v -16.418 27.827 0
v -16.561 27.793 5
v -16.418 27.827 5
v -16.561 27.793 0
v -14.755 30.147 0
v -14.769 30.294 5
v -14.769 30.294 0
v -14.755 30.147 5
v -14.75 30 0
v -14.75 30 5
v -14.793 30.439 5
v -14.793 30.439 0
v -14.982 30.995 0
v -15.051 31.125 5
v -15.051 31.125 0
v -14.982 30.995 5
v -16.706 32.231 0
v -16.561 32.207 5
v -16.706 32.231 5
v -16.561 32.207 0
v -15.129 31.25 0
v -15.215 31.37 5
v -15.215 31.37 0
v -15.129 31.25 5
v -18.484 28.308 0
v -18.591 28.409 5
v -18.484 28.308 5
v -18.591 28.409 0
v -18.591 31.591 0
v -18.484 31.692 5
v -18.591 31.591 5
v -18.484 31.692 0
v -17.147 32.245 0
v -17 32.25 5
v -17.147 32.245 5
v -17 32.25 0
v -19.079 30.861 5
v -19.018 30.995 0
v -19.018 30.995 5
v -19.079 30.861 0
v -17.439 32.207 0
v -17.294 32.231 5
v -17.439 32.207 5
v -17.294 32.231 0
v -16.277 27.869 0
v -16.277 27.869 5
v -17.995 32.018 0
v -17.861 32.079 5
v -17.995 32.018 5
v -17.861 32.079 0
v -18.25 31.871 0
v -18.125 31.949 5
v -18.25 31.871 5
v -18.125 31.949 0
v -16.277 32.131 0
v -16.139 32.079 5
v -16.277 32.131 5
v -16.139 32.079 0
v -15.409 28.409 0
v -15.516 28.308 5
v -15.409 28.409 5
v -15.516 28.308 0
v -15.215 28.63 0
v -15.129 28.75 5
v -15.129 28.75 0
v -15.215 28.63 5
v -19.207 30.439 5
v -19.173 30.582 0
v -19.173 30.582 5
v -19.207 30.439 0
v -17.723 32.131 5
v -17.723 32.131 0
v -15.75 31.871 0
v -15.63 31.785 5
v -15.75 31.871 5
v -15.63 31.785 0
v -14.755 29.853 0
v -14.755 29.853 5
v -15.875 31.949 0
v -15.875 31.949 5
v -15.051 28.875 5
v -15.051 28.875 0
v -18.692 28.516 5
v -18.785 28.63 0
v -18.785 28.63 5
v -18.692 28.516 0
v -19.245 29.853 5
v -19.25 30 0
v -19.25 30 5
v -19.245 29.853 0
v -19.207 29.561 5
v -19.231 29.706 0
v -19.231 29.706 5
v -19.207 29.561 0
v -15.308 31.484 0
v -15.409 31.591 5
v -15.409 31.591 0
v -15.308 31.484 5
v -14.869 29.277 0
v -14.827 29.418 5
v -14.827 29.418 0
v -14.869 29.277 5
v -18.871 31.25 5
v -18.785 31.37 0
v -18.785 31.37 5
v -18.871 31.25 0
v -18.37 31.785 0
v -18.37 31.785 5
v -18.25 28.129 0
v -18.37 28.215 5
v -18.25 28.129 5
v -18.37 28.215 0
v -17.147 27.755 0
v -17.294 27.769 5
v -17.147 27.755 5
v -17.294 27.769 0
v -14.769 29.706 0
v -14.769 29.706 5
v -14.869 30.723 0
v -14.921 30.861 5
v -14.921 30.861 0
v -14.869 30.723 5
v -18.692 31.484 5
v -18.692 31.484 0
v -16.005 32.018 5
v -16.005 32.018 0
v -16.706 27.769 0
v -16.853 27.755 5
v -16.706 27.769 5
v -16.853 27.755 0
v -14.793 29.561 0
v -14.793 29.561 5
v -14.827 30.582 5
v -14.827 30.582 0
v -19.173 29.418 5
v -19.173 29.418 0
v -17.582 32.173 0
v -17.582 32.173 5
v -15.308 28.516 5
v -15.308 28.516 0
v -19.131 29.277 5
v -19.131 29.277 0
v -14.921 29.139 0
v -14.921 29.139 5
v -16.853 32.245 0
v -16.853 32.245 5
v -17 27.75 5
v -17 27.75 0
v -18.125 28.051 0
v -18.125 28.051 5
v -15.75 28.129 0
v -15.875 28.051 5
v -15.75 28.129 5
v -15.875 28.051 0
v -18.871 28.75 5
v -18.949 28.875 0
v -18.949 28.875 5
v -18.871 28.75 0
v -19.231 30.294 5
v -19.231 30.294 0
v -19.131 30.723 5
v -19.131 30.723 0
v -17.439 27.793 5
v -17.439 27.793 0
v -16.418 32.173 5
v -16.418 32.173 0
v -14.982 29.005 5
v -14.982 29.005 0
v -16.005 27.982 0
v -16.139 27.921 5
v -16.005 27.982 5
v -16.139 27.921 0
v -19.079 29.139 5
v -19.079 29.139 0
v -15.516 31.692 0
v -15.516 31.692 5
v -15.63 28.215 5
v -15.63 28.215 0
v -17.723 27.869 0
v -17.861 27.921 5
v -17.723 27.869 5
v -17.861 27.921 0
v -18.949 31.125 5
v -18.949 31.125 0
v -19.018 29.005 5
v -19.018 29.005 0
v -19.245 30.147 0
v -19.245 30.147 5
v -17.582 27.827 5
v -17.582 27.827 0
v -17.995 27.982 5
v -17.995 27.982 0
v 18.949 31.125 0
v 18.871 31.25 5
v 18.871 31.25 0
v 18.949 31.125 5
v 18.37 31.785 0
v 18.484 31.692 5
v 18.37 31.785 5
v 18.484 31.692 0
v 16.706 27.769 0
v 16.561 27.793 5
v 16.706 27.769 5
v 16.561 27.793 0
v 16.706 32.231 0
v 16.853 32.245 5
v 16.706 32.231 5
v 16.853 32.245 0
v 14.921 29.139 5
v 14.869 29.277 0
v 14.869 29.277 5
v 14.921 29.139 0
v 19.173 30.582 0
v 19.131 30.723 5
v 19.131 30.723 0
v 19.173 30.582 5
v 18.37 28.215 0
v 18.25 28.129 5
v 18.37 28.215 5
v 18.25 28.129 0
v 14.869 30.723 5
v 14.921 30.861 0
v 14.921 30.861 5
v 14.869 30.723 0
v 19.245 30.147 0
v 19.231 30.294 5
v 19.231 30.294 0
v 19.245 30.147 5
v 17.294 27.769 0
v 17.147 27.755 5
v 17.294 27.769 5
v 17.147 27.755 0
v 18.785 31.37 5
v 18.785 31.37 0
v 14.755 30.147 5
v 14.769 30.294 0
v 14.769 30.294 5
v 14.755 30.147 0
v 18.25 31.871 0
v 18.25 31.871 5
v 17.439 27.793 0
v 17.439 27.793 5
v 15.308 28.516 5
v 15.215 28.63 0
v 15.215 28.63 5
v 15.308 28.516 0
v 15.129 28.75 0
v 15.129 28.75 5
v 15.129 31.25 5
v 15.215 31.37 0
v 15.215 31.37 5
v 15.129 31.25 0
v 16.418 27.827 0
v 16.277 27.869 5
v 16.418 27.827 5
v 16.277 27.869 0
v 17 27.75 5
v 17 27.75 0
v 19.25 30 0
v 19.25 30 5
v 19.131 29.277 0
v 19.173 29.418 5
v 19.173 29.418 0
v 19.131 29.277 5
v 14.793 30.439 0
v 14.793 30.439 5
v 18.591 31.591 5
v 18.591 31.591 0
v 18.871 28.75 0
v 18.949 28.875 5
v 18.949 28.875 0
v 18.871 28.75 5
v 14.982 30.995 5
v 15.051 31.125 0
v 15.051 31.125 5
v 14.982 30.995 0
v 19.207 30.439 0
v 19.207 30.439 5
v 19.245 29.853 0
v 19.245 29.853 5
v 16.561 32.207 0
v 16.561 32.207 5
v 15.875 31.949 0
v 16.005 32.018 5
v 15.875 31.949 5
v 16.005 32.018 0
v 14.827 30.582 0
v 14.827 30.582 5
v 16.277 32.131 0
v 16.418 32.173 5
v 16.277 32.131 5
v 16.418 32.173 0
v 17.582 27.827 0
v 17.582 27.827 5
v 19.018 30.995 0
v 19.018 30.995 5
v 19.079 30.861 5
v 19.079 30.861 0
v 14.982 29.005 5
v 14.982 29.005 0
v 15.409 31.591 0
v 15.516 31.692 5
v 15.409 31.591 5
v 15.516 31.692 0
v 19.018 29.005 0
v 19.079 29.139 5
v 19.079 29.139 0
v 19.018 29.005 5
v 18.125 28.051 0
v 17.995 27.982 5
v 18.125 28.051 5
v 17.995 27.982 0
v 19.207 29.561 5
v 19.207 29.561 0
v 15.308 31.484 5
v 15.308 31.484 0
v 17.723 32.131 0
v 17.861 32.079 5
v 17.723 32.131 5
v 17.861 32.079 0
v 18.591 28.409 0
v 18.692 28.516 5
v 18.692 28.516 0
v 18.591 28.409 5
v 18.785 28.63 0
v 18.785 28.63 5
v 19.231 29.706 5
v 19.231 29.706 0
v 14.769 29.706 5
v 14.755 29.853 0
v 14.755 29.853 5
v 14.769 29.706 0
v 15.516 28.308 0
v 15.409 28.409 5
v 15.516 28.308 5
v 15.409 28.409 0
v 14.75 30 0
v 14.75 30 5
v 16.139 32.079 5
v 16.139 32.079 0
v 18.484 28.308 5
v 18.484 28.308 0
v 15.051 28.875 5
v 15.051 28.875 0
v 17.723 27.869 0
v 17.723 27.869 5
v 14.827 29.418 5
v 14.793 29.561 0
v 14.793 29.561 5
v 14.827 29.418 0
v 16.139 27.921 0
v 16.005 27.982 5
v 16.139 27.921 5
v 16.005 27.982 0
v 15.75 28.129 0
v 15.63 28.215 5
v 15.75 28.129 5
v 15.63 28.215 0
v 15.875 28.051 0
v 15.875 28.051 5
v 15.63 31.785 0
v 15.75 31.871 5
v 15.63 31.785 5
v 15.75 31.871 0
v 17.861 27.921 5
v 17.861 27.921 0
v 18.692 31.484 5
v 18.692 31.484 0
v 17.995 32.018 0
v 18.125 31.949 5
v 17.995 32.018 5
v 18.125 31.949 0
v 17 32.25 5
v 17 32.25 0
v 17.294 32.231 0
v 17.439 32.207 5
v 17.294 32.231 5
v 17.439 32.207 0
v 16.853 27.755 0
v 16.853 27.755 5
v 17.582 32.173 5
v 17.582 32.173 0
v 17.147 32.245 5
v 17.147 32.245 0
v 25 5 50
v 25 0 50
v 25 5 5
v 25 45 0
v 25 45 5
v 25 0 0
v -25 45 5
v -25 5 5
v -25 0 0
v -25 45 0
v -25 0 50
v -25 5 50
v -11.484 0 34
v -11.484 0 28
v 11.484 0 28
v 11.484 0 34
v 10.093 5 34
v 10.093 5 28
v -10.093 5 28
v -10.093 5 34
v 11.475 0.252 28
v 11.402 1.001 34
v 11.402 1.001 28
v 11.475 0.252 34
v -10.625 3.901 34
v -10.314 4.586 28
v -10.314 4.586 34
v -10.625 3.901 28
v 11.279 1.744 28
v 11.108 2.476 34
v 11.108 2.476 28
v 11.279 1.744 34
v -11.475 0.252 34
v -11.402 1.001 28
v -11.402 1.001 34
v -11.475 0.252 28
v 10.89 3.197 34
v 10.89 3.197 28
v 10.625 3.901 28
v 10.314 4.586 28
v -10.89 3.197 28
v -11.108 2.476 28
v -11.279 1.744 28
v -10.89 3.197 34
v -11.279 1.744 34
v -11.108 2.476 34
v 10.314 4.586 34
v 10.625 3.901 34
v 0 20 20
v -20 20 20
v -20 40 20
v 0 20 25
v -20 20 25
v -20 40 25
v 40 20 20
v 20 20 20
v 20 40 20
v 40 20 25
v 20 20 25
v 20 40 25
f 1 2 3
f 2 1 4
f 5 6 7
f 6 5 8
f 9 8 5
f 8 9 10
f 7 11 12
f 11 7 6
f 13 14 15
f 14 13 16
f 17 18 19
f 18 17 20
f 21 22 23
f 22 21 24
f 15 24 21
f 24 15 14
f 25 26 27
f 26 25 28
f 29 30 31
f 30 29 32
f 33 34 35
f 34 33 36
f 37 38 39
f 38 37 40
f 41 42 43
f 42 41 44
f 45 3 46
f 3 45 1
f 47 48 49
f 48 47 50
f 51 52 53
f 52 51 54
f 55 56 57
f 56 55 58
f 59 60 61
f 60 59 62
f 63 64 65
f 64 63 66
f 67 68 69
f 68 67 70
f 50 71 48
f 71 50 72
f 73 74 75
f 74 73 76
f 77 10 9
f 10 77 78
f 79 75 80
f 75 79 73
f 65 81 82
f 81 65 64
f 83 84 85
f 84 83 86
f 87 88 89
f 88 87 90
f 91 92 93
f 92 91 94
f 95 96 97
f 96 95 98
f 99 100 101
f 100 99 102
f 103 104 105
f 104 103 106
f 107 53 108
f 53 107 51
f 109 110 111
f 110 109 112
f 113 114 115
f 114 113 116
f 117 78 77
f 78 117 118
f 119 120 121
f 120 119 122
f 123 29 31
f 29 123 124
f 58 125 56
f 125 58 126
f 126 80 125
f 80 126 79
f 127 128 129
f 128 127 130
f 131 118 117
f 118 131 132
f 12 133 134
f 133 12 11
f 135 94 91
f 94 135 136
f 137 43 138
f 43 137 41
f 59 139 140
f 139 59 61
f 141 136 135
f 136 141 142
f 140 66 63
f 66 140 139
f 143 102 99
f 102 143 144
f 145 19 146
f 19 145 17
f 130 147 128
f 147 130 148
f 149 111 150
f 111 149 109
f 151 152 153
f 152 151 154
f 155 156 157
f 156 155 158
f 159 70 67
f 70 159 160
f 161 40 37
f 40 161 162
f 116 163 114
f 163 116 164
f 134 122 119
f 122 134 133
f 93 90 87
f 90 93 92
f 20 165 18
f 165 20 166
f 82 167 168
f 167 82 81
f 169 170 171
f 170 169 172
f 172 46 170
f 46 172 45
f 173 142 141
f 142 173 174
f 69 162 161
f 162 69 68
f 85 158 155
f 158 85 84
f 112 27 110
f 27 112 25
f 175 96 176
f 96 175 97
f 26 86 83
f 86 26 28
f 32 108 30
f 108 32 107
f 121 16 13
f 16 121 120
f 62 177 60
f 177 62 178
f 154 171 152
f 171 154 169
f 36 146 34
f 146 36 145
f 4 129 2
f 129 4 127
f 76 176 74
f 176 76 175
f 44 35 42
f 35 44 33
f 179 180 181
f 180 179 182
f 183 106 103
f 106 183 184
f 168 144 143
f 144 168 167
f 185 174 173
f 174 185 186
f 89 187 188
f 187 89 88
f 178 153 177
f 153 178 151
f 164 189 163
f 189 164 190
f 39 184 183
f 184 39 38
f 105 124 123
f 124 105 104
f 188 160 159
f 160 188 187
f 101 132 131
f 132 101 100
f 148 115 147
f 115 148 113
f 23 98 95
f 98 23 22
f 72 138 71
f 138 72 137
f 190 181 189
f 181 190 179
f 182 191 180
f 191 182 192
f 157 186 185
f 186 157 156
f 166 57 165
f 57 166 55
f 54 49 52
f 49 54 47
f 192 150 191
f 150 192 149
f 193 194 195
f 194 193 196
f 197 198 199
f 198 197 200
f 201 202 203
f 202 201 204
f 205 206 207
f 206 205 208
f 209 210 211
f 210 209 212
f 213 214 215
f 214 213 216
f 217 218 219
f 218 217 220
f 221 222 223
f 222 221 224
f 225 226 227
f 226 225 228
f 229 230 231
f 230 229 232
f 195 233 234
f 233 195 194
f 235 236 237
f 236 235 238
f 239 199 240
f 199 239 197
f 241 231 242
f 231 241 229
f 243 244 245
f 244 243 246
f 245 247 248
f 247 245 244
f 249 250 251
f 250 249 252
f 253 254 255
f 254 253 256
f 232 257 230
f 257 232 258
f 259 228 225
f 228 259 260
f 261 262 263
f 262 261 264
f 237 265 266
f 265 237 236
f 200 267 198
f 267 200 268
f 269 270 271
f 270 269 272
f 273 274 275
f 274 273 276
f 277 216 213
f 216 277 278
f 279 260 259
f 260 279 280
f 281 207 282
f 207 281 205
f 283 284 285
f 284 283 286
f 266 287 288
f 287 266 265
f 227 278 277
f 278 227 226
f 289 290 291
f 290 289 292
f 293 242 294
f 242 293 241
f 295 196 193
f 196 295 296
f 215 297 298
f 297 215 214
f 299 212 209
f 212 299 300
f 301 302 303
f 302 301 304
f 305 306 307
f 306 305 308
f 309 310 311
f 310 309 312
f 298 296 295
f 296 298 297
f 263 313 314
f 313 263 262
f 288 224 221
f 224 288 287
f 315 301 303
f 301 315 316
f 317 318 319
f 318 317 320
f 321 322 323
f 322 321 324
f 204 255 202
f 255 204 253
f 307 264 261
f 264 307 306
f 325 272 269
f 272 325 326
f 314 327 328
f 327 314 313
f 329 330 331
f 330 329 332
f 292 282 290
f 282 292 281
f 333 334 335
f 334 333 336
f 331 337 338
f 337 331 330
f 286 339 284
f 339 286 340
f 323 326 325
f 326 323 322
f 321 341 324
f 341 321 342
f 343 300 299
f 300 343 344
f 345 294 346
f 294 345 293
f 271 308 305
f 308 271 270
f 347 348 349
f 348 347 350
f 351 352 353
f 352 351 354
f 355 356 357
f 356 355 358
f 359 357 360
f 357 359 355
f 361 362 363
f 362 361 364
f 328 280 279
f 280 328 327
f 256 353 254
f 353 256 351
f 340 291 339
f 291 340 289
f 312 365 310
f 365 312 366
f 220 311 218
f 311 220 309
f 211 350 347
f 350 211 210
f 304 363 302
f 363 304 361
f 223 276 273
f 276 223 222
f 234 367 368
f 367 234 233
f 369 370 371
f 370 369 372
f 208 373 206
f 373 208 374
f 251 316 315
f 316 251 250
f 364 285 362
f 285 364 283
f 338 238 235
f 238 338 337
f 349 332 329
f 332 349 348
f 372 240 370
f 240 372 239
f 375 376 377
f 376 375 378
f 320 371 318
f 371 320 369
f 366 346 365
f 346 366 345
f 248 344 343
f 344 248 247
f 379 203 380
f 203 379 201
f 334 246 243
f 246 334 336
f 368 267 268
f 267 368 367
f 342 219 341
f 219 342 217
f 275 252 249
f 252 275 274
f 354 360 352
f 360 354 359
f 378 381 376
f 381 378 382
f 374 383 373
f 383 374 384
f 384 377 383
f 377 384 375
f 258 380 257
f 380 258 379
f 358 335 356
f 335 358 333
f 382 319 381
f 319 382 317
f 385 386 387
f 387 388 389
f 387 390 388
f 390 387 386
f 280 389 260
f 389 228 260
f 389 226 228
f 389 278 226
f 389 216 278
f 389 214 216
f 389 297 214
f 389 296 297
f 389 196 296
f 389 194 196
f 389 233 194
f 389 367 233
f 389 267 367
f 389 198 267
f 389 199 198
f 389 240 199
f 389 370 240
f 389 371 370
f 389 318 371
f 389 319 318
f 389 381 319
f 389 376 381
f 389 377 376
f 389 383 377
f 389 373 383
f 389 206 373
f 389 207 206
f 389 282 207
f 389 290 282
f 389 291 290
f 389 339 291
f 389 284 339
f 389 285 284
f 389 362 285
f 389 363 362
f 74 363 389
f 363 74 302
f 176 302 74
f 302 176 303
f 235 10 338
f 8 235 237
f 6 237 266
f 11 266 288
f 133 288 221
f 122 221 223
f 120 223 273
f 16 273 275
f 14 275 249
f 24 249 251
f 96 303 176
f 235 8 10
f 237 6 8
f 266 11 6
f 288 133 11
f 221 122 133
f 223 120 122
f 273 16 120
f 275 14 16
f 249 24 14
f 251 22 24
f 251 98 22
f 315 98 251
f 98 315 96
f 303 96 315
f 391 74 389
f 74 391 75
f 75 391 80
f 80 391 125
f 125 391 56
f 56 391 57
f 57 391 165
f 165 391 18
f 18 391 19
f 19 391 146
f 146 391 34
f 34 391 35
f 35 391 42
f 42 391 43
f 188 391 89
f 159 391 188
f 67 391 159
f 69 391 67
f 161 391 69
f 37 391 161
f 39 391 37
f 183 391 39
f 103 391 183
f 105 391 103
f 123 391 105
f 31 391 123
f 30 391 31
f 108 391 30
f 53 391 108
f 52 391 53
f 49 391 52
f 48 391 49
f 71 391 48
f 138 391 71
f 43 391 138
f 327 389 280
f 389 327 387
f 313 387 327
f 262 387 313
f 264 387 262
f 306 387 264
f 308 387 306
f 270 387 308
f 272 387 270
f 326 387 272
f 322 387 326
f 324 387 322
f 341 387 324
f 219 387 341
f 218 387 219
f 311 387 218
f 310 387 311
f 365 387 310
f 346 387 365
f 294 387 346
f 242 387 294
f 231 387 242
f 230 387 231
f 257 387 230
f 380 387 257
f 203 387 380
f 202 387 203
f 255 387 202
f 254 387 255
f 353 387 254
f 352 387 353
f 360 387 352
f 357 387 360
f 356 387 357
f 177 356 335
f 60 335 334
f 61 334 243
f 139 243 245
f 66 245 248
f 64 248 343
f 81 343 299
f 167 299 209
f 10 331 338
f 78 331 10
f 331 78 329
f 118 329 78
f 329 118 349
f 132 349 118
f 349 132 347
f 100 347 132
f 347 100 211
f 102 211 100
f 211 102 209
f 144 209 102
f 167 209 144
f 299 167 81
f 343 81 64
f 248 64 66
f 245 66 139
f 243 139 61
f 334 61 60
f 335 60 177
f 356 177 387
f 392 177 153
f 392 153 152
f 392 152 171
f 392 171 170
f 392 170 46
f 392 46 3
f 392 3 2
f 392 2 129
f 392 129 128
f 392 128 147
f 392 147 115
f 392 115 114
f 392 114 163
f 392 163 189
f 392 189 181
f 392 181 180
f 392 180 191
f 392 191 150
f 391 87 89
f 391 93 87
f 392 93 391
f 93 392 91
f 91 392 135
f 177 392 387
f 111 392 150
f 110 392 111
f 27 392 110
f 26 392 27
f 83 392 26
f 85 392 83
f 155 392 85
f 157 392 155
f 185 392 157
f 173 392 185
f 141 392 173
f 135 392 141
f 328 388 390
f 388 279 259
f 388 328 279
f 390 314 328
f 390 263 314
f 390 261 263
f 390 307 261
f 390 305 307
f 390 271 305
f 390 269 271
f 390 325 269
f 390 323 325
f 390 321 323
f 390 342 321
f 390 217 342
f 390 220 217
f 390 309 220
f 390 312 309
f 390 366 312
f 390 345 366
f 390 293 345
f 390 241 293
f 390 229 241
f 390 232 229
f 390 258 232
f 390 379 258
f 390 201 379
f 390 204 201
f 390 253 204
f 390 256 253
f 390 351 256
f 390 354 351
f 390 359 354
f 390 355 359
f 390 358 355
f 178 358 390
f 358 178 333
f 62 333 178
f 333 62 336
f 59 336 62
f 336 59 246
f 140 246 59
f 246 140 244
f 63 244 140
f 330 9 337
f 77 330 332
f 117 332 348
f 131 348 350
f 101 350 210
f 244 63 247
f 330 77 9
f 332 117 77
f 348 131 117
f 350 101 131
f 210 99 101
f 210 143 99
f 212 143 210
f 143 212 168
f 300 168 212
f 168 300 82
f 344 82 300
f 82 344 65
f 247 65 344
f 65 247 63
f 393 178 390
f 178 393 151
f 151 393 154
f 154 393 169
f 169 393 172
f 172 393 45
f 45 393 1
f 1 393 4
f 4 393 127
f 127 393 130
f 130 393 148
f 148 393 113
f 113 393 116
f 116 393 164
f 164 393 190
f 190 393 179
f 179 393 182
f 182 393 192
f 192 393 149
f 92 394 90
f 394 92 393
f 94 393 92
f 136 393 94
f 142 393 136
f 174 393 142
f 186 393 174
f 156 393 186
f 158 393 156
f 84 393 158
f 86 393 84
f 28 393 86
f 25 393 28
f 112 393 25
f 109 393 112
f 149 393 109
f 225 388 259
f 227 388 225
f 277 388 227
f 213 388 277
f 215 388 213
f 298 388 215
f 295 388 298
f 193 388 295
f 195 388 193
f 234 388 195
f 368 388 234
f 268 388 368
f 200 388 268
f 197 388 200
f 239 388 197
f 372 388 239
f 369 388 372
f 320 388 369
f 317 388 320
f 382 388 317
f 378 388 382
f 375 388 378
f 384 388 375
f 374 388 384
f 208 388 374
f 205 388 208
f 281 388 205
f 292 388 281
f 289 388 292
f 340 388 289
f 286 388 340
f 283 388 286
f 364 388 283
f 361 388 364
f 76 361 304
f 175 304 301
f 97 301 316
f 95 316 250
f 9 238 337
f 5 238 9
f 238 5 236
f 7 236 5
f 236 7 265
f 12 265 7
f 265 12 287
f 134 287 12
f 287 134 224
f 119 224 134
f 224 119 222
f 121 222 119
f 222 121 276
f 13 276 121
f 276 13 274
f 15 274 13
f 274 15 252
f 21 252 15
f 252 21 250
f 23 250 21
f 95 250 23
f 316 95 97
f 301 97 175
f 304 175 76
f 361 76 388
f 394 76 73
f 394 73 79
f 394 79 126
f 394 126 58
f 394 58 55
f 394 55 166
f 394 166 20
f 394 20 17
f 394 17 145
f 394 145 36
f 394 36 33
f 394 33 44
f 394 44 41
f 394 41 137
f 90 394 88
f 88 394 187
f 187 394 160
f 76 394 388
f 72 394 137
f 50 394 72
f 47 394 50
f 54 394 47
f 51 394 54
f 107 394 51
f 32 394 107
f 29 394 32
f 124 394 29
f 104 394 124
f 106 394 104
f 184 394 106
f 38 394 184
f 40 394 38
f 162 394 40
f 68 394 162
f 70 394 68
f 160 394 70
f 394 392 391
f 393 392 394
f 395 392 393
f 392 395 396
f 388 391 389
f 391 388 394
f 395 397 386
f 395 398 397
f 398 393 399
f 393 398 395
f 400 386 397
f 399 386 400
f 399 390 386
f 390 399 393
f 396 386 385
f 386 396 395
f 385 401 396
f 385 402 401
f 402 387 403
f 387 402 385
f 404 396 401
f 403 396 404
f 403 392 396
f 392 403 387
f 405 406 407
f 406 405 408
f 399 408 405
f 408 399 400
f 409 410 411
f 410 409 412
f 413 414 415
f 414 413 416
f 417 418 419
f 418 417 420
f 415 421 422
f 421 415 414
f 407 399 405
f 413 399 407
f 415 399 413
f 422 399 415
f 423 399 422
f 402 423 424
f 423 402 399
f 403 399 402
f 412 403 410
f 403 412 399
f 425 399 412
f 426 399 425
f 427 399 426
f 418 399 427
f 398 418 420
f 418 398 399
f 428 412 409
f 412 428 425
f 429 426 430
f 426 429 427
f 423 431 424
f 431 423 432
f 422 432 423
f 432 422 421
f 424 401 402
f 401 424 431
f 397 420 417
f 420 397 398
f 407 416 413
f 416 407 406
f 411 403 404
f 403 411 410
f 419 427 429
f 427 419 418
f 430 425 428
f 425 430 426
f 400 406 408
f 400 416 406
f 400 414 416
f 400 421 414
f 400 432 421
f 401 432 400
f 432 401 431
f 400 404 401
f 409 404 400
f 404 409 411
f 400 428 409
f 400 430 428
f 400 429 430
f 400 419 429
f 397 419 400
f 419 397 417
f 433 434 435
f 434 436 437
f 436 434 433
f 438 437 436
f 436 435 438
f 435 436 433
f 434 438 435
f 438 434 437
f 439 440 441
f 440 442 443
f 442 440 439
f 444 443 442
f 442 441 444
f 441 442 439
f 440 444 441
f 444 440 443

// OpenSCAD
// L-shaped mounting bracket for NEMA 17 stepper motor (syringe pump)
// Print orientation: base plate on bed, motor plate builds upward (+Z)

// ---------- Parameters ----------
base_x0      = -25;   // base plate x start
base_x1      = 25;    // base plate x end
base_y0      = 0;     // base plate y start
base_y1      = 45;    // base plate y end
base_z0      = 0;     // base plate z start
base_z1      = 5;     // base plate z end

motor_x0     = -25;   // motor plate x start
motor_x1     = 25;    // motor plate x end
motor_y0     = 0;     // motor plate y start
motor_y1     = 5;     // motor plate y end
motor_z0     = 0;     // motor plate z start
motor_z1     = 50;    // motor plate z end

boss_d       = 23;    // motor centring boss hole diameter
boss_x       = 0;     // boss hole x centre
boss_z       = 28;    // boss hole z centre
screw_d      = 3.4;   // M3 screw holes diameter
screw_n      = 4;     // number of screw holes
screw_pitch  = 31;    // square pattern side length

gusset_t     = 5;     // gusset thickness along X
gusset_y     = 20;    // gusset leg along +Y
gusset_z     = 20;    // gusset leg along +Z

eps          = 0.5;   // cutter overshoot past faces
$fn          = 96;    // curve resolution

// ---------- Model ----------
union() {
    // Base plate with M4 through-holes
    difference() {
        translate([base_x0, base_y0, base_z0])
            cube([base_x1 - base_x0, base_y1 - base_y0, base_z1 - base_z0]);
        for (sx = [-17, 17])
            translate([sx, 30, -eps])
                cylinder(d = 4.5, h = base_z1 - base_z0 + 2 * eps);
    }

    // Motor plate with boss hole and M3 screw holes
    difference() {
        translate([motor_x0, motor_y0, motor_z0])
            cube([motor_x1 - motor_x0, motor_y1 - motor_y0, motor_z1 - motor_z0]);
        translate([boss_x, -eps, boss_z])
            cylinder(d = boss_d, h = motor_y1 - motor_y0 + 2 * eps);   // boss hole
        for (i = [0 : screw_n - 1])
            for (j = [0 : screw_n - 1])
                translate([(i - (screw_n - 1) / 2) * screw_pitch,
                           (j - (screw_n - 1) / 2) * screw_pitch,
                           -eps])
                    cylinder(d = screw_d, h = motor_y1 - motor_y0 + 2 * eps);  // screw holes
    }

    // Gussets, flush with left and right edges
    for (offset = [-1, 1]) {
        x0 = offset * (25 - gusset_t);   // x = -20 or x = 20
        translate([x0, gusset_y, gusset_z])
            linear_extrude(height = gusset_t)
                polygon([[0, 0], [gusset_y, 0], [0, gusset_z]]);  // right triangle in YZ
    }
}
